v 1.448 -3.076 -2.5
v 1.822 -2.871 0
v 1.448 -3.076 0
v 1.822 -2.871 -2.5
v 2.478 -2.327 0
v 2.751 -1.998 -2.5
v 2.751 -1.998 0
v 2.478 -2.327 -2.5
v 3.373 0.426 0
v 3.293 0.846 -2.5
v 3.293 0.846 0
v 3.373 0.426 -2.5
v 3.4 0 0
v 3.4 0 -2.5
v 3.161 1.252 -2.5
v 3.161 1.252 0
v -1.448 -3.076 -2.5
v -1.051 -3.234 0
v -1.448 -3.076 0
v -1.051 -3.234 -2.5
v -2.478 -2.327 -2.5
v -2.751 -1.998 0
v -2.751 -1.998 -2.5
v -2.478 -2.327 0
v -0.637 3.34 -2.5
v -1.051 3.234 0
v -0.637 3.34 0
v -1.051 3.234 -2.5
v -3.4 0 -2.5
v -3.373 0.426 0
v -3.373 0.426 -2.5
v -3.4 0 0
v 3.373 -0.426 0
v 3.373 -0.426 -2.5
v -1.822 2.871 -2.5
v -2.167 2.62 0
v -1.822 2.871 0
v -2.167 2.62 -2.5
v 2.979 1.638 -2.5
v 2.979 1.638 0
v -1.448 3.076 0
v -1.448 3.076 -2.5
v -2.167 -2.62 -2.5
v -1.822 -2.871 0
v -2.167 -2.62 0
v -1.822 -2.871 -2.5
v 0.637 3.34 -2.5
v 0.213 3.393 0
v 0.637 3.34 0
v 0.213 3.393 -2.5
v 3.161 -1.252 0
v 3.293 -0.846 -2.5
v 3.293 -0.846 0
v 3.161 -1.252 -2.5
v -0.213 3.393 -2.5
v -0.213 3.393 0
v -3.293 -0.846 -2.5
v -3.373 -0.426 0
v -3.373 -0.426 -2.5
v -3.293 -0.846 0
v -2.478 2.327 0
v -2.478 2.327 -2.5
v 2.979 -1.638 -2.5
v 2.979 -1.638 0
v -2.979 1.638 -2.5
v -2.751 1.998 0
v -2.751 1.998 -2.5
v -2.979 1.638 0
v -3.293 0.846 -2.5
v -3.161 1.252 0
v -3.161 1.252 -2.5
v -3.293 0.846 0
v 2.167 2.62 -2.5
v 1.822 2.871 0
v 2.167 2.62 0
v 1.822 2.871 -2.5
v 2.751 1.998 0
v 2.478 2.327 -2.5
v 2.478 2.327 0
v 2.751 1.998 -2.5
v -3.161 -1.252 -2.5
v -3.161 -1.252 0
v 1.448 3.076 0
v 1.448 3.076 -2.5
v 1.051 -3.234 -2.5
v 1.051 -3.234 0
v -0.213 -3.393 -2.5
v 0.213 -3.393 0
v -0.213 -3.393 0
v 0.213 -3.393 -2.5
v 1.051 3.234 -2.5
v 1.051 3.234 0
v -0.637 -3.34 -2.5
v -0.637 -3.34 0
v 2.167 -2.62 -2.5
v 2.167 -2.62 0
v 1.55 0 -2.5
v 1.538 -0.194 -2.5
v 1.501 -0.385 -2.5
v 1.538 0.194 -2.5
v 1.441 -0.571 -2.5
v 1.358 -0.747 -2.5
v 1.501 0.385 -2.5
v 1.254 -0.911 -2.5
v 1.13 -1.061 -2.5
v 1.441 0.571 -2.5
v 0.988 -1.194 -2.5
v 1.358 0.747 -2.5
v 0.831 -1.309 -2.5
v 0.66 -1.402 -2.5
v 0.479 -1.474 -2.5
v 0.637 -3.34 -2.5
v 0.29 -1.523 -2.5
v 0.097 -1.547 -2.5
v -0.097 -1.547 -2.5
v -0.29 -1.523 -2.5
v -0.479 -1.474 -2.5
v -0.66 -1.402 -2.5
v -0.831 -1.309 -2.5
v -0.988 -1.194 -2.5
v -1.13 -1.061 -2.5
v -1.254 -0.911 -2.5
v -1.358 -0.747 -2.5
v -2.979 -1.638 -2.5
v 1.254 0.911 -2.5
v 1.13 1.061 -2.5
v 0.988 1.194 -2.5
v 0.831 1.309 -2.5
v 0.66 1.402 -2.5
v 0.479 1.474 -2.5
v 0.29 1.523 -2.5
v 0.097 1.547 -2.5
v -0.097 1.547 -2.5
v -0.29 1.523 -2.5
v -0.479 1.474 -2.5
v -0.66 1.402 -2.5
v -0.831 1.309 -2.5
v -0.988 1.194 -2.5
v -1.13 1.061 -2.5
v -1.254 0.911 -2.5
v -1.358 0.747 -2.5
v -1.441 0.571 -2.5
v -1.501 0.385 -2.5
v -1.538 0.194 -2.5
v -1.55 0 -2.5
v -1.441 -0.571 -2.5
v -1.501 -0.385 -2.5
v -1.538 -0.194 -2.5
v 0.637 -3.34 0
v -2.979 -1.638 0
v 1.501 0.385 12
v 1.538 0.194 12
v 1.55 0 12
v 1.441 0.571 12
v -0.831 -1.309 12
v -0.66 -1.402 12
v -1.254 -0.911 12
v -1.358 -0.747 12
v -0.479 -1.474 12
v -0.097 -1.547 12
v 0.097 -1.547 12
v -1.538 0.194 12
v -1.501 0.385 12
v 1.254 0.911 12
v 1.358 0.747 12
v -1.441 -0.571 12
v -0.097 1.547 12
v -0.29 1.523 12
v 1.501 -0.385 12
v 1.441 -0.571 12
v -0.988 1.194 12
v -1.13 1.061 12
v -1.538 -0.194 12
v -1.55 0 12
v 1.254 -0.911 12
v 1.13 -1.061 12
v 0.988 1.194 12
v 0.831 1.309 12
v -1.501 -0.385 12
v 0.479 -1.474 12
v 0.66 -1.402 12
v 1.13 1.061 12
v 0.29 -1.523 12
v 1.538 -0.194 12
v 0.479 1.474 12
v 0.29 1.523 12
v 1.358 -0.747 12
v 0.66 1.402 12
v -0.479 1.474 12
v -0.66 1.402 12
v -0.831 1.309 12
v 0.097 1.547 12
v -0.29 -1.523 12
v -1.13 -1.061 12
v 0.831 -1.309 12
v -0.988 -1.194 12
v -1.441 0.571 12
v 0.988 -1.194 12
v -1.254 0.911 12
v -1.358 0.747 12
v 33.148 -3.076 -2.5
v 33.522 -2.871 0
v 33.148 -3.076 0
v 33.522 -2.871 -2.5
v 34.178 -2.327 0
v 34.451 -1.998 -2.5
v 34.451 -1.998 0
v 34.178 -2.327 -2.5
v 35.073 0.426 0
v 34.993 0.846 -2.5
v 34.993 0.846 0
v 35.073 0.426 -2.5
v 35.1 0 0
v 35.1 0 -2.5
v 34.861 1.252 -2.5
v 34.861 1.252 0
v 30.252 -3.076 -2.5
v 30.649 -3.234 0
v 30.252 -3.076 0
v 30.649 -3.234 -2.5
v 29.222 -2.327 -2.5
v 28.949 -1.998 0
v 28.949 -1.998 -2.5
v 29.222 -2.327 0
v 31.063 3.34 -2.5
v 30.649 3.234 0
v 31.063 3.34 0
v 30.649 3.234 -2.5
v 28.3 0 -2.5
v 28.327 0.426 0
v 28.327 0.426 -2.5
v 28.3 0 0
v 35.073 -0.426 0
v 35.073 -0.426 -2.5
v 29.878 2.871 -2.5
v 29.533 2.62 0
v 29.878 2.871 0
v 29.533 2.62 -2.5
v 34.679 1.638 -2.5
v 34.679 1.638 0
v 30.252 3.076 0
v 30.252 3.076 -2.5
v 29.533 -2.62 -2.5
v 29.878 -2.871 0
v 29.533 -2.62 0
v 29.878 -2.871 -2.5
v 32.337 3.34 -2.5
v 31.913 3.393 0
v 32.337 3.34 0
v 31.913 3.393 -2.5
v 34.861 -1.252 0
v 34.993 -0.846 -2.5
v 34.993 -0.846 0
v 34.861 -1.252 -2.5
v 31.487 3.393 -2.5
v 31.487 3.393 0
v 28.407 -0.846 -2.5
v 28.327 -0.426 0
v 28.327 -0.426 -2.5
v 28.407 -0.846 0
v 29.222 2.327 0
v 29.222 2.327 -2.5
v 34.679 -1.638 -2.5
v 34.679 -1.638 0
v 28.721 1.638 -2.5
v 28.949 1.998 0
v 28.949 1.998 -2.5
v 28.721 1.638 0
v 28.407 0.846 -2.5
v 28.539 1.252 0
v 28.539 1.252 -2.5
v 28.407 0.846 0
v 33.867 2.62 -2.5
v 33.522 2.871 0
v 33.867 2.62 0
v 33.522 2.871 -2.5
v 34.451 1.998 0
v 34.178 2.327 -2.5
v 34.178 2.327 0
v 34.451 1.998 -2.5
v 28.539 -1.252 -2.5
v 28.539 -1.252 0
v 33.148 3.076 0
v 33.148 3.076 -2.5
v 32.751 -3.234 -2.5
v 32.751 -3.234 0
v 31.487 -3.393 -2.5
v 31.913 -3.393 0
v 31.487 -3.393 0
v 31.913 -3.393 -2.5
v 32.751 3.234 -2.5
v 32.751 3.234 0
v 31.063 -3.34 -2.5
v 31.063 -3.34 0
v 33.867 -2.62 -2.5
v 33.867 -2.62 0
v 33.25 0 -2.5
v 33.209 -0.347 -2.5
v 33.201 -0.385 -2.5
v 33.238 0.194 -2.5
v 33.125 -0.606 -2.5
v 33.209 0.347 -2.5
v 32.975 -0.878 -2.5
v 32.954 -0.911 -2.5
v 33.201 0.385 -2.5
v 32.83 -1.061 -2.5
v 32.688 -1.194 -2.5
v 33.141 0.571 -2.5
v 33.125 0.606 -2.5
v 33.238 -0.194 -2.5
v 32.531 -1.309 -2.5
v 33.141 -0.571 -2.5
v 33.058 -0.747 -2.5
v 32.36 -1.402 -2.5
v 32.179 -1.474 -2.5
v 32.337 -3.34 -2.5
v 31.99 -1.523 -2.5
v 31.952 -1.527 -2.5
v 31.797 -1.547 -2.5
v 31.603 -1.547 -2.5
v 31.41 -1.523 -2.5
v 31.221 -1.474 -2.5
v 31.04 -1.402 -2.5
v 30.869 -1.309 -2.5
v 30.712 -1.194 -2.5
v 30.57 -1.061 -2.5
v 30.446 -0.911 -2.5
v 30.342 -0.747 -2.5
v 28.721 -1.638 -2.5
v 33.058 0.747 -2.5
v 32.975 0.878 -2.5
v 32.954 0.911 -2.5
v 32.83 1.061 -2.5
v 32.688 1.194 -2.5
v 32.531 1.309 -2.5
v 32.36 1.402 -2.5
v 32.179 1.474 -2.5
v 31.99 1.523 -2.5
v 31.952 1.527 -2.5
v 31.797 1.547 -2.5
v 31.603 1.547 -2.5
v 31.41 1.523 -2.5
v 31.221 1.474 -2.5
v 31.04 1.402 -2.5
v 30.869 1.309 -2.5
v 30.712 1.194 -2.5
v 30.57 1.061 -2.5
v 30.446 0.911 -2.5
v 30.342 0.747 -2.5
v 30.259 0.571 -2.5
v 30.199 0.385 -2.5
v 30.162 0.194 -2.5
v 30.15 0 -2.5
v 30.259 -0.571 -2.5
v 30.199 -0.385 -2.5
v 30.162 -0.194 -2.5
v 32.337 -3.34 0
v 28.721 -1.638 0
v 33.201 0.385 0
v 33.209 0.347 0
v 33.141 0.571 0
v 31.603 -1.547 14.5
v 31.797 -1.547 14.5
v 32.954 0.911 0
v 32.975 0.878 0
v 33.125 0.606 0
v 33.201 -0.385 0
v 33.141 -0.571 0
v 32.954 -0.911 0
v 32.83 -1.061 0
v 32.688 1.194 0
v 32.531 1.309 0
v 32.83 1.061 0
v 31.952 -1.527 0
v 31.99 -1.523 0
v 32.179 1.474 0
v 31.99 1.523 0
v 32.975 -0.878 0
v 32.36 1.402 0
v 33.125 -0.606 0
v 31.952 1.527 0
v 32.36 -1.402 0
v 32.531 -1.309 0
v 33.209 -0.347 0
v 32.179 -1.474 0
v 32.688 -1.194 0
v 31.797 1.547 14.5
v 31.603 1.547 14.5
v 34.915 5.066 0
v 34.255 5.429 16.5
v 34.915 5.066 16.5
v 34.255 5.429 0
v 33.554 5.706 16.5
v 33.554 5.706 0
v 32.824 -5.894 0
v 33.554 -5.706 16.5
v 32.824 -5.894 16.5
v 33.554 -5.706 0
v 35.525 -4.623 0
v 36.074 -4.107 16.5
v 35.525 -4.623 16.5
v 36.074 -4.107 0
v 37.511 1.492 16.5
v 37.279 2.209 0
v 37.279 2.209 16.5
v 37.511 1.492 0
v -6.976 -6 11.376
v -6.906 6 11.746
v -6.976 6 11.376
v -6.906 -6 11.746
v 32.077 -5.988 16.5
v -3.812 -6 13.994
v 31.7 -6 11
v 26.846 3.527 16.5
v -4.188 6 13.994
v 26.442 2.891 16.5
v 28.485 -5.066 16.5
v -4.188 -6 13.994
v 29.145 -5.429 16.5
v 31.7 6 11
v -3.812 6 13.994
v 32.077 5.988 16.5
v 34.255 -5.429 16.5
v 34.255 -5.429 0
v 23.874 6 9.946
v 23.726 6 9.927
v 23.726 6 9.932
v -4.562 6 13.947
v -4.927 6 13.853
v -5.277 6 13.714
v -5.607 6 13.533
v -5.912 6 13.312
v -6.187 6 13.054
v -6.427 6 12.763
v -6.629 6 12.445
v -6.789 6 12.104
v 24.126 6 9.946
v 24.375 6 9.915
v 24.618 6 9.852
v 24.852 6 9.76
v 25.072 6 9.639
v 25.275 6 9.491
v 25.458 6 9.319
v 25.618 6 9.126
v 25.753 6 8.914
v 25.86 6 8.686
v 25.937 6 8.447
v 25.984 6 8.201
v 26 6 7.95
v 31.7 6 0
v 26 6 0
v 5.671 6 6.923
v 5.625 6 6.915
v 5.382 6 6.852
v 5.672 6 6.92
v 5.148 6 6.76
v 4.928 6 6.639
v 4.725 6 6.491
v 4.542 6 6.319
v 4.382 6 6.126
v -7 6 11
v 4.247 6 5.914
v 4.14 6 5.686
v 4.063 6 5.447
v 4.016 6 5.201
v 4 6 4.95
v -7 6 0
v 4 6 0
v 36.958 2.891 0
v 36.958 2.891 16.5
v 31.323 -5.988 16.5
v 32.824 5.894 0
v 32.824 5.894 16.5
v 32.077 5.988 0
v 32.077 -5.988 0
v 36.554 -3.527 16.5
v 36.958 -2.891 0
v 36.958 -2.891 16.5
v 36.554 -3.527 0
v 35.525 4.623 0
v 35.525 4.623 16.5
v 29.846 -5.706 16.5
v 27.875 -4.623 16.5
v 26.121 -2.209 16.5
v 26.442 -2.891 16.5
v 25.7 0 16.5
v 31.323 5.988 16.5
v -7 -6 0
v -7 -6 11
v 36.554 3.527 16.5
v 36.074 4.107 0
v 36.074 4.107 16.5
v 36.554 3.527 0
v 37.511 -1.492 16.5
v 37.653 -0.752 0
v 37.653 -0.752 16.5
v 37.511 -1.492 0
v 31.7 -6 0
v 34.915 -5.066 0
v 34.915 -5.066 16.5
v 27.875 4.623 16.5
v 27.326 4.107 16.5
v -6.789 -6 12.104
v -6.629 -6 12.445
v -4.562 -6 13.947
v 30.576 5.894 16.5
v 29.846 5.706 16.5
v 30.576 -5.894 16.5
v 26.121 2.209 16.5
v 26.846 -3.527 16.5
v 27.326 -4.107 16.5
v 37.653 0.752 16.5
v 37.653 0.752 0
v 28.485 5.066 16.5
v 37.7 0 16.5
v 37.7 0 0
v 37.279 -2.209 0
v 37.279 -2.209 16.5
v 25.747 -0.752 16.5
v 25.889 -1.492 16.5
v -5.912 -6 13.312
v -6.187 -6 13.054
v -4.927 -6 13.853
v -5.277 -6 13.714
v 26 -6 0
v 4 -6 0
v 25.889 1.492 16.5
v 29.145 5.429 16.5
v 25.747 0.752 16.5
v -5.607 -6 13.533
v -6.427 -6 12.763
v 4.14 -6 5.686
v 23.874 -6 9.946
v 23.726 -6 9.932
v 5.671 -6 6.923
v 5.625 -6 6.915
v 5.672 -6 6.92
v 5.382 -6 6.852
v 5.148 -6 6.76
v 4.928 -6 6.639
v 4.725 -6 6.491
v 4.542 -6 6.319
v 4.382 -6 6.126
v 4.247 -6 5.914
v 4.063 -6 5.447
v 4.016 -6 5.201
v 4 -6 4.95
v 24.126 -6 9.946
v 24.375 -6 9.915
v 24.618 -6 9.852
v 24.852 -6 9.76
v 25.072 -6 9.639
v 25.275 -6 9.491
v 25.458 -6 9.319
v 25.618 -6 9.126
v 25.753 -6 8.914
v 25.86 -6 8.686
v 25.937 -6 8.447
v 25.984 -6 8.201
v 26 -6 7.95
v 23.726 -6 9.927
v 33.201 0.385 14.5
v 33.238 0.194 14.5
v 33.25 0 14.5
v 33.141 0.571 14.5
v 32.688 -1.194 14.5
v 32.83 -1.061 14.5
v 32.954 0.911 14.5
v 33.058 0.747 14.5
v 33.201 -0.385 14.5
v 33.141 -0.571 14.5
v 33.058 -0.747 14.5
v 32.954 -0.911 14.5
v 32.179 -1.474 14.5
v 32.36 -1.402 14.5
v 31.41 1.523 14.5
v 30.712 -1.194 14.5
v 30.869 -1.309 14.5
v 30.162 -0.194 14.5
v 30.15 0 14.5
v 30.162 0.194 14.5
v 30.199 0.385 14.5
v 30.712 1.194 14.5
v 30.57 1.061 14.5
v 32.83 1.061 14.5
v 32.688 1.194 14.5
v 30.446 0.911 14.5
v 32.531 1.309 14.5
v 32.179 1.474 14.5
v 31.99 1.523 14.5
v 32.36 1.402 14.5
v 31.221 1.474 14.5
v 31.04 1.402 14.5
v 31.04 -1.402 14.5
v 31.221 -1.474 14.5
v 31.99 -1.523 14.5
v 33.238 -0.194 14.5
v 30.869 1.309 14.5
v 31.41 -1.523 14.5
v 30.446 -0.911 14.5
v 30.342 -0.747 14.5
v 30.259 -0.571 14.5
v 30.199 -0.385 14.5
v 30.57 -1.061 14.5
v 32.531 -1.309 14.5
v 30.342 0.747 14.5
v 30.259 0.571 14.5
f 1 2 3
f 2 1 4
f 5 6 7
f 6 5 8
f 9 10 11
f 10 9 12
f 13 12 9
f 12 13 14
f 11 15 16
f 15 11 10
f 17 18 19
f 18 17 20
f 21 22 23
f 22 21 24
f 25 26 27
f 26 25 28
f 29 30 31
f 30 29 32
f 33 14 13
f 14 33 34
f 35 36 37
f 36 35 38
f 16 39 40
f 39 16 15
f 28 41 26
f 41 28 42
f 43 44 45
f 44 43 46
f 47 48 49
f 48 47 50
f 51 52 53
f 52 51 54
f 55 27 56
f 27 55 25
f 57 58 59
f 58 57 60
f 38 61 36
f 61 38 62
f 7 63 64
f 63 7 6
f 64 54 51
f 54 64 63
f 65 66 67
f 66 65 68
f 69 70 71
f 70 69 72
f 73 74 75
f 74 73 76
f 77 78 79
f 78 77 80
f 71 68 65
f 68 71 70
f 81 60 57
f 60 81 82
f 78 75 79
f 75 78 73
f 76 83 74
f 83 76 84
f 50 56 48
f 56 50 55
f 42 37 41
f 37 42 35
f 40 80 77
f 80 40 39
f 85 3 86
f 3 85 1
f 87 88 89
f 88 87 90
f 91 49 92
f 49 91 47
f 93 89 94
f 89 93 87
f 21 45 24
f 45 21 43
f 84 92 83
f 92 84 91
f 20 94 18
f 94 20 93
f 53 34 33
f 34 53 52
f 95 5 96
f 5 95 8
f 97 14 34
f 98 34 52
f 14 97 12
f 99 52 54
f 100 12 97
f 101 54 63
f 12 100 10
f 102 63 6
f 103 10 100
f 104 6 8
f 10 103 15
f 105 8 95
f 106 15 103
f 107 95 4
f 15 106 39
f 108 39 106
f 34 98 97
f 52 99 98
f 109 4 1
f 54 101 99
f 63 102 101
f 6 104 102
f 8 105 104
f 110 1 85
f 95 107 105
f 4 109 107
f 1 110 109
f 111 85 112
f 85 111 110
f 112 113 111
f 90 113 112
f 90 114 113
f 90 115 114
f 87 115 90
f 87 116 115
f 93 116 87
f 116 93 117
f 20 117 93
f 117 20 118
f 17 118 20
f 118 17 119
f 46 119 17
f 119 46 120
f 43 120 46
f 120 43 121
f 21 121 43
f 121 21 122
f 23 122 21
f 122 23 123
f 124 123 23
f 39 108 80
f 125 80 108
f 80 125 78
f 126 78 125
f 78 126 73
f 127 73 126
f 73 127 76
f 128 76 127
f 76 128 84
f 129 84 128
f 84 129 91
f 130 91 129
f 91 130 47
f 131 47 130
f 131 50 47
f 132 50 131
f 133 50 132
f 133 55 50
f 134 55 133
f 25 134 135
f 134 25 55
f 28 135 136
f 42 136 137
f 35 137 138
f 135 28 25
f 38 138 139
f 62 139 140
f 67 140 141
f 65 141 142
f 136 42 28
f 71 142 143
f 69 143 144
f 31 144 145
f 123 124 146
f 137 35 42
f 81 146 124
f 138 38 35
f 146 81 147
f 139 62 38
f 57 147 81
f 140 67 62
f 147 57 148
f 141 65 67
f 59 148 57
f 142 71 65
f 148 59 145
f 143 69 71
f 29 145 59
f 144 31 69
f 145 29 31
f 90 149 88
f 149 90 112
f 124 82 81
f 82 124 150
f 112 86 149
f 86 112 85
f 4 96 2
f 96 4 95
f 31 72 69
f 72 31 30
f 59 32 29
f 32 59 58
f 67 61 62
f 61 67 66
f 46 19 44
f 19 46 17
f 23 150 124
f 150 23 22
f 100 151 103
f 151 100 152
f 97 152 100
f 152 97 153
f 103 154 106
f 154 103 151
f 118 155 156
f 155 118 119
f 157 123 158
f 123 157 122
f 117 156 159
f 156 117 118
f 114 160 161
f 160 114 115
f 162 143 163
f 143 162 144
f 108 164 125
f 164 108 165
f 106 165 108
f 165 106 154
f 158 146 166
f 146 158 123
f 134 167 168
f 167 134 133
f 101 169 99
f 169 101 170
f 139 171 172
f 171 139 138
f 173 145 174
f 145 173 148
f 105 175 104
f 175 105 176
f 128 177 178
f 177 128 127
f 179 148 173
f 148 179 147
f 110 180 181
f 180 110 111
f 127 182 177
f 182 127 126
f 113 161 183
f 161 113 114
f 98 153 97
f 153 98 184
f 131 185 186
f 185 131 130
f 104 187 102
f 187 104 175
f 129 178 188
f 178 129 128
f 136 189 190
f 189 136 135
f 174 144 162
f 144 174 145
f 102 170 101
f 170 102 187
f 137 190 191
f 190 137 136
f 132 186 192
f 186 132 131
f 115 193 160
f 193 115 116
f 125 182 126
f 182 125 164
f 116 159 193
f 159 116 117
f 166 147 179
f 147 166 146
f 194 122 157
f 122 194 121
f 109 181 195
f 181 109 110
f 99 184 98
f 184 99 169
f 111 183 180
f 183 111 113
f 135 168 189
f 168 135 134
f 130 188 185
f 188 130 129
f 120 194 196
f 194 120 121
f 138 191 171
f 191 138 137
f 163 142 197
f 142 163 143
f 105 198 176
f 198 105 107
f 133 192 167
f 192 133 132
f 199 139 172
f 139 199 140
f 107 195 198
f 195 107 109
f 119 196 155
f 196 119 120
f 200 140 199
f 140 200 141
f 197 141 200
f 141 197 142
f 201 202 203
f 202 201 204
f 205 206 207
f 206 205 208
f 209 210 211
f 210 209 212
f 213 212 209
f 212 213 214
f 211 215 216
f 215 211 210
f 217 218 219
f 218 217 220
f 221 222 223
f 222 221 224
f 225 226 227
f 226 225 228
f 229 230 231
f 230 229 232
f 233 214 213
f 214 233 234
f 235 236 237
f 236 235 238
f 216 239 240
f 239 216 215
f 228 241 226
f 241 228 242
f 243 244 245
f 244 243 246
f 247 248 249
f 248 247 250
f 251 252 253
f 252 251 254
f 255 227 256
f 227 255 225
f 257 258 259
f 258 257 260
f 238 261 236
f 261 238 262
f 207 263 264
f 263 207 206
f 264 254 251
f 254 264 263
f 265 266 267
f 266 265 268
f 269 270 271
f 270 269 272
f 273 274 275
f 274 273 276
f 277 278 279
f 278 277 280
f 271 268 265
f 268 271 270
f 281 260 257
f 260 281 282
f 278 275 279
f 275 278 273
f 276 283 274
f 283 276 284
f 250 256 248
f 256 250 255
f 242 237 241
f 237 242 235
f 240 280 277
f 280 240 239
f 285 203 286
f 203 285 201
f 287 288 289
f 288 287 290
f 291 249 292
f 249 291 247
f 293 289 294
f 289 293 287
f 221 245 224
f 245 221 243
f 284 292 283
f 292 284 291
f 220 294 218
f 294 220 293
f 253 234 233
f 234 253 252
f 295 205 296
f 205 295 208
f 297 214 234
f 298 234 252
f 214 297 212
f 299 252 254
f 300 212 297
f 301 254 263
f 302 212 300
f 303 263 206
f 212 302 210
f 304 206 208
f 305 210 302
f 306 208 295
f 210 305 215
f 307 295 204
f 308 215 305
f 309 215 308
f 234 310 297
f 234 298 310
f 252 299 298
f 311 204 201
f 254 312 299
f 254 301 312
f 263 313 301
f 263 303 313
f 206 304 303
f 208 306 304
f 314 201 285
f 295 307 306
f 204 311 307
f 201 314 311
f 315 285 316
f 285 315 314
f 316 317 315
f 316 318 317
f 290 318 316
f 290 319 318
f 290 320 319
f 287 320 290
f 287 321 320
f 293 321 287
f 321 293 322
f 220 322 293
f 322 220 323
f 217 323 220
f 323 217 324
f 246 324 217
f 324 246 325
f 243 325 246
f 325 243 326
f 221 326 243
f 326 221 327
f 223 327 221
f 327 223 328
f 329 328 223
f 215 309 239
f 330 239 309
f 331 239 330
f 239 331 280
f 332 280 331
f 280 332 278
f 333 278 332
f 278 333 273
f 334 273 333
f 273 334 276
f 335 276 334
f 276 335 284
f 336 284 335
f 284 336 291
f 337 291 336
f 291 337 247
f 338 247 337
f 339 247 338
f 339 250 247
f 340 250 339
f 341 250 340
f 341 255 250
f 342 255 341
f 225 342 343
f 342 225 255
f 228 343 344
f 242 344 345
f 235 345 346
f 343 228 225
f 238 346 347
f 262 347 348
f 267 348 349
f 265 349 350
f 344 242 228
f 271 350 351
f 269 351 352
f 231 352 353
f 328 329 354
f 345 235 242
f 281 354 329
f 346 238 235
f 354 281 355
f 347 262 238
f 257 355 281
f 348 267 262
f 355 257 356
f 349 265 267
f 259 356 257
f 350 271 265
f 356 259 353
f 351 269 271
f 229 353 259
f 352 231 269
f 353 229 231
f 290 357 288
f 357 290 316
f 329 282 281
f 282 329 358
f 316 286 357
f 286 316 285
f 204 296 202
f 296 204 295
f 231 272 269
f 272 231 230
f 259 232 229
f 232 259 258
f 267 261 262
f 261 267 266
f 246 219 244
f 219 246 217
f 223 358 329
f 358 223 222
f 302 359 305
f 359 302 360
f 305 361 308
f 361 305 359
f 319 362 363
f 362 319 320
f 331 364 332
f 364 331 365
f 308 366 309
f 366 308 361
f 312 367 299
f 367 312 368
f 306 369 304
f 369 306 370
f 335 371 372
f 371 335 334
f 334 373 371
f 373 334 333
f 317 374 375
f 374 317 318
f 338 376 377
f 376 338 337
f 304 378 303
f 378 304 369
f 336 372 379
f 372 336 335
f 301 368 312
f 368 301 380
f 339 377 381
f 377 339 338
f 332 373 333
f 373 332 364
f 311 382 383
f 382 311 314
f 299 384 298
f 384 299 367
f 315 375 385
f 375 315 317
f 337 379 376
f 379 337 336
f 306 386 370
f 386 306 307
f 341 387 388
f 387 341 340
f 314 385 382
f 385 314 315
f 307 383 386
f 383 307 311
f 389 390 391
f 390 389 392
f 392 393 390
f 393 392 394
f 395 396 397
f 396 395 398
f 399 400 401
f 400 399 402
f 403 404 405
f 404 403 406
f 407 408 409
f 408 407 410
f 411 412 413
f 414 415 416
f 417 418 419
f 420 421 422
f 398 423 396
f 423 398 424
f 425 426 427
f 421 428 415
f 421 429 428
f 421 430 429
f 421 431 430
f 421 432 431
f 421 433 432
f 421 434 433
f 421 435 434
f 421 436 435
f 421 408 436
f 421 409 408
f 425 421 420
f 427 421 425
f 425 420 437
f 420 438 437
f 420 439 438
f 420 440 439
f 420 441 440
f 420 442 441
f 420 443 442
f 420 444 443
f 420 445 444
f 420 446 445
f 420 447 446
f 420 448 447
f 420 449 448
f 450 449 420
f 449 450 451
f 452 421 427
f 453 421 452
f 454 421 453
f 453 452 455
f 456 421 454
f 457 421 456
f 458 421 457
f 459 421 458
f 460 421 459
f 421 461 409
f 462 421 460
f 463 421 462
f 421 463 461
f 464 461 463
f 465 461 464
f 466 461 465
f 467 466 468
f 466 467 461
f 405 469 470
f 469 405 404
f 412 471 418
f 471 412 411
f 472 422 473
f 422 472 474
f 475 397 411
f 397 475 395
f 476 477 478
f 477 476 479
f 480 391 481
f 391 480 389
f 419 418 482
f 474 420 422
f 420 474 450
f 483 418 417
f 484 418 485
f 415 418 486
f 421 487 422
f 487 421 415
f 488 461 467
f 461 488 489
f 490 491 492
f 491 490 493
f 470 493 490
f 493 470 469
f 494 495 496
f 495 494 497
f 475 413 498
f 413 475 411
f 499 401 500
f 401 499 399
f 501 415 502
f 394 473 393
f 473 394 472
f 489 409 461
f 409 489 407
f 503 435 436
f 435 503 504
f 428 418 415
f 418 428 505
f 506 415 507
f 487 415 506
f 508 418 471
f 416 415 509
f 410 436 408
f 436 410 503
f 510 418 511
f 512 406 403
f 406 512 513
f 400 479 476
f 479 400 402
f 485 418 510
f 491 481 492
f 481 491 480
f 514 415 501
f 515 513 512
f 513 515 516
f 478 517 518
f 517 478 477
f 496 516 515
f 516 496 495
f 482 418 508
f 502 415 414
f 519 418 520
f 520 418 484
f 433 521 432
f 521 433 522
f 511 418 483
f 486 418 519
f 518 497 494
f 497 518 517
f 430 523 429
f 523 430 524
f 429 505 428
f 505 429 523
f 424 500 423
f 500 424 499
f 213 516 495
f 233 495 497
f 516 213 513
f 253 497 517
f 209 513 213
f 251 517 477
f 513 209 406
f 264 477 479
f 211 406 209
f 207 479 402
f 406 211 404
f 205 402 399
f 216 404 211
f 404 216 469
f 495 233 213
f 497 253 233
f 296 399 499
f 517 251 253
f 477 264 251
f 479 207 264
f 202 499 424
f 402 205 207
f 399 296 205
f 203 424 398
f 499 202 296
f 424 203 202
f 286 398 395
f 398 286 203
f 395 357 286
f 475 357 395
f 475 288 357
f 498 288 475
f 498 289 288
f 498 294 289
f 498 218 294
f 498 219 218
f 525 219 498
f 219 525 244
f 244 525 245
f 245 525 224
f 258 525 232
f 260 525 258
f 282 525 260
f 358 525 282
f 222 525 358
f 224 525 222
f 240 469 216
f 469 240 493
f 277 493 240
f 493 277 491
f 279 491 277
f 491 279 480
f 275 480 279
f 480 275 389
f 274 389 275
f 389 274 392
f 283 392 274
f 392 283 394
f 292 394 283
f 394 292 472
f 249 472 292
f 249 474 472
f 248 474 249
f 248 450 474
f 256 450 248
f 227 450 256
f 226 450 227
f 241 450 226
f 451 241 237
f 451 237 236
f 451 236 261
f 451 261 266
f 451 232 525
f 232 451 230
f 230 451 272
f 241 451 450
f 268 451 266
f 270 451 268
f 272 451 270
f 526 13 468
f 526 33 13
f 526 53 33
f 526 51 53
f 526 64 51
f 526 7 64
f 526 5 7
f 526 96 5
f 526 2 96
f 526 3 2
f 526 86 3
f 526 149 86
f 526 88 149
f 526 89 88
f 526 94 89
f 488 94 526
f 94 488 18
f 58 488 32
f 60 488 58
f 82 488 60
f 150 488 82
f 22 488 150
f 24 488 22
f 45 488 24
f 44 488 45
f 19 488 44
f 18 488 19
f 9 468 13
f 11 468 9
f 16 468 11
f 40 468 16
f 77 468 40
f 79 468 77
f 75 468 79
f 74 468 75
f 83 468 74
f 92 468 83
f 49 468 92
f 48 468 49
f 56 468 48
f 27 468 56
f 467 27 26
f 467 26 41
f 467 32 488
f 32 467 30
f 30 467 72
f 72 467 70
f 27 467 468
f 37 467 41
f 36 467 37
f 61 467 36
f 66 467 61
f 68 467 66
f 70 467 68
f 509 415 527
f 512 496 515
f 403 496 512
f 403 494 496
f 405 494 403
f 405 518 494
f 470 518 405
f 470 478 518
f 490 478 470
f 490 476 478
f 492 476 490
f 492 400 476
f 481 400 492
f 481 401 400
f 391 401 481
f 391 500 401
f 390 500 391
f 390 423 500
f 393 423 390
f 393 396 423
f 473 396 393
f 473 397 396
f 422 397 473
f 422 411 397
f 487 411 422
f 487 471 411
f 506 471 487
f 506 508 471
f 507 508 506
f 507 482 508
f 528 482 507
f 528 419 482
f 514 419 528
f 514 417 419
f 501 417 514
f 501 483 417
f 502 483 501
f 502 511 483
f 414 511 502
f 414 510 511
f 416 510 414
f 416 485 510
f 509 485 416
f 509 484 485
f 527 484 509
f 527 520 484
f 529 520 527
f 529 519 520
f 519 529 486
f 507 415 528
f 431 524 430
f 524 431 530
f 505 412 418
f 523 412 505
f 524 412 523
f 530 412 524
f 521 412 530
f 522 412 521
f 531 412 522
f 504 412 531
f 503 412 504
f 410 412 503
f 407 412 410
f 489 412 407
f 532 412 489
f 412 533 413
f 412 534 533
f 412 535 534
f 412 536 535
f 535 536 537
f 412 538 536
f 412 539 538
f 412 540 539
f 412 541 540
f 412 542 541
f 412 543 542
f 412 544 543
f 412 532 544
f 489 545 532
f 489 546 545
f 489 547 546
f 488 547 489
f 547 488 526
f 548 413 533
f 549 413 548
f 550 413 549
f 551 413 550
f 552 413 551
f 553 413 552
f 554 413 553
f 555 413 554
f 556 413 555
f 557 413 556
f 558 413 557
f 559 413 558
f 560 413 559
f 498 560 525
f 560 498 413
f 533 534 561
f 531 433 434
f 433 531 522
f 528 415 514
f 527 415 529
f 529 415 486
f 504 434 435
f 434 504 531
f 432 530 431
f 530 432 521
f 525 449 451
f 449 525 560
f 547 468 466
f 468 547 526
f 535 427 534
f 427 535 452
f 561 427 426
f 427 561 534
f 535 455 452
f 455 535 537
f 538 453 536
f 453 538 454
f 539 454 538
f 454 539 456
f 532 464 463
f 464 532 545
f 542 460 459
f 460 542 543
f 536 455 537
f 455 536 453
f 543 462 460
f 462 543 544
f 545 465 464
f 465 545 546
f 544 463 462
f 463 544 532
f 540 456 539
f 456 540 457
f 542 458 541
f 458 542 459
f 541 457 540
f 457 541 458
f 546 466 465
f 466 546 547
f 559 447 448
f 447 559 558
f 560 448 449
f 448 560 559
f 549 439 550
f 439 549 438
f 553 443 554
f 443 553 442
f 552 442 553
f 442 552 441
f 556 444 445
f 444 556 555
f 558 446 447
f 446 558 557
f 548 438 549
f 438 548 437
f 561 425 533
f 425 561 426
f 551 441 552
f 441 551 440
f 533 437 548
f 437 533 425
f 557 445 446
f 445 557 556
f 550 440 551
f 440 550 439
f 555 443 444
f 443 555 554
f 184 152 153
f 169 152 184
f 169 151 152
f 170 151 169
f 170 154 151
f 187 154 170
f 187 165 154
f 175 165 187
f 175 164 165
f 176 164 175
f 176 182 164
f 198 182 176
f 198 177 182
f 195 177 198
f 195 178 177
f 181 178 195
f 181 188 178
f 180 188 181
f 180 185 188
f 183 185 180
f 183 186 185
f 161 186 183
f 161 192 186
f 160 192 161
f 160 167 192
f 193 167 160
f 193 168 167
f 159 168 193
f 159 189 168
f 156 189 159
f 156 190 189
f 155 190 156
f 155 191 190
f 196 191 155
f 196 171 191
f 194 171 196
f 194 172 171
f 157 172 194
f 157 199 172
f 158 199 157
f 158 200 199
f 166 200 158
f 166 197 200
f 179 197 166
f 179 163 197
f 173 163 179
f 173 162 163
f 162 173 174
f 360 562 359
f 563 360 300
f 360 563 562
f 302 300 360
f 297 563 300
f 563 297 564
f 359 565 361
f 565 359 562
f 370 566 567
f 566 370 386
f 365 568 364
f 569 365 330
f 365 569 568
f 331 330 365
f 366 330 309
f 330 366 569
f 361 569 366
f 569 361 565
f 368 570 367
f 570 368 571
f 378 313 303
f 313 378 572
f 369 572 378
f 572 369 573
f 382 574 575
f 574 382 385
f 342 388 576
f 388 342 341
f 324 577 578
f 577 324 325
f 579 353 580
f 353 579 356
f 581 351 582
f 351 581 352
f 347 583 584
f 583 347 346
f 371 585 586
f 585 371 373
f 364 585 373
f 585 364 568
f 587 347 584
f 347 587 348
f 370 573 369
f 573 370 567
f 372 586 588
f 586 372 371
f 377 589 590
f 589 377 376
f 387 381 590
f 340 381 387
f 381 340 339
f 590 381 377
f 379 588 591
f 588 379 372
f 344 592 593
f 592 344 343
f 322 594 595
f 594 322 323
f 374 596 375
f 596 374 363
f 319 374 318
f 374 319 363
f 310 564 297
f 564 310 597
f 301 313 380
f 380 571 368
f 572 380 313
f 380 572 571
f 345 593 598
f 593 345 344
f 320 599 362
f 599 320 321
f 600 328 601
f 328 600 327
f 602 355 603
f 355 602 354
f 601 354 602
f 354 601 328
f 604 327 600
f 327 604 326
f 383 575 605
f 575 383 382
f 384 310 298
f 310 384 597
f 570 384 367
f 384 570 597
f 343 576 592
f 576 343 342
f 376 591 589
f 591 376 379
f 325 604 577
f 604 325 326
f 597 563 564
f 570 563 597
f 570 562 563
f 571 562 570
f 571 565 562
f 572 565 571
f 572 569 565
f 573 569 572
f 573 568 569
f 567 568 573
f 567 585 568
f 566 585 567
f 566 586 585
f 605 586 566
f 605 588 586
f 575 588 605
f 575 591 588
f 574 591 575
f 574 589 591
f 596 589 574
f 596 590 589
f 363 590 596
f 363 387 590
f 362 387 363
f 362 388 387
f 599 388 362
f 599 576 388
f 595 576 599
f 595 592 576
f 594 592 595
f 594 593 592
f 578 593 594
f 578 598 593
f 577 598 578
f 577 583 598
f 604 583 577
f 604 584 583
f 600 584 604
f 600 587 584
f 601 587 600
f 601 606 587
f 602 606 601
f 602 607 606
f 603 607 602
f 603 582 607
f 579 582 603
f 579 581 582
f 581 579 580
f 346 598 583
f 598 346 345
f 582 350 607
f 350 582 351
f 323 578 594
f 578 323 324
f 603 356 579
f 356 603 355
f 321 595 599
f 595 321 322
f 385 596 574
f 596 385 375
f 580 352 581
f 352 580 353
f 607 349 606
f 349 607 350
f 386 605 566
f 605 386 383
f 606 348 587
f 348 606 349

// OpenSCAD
lr = 12;    //12.2;
lg = 46;    //45.8;

h1 = 14;
h2 = 16.5;

dist_vis = 31.7;
delta_vis_h1 = 7;

lg_trou = 22;
dist_lg = 11;
ep_trou_h1 = 7;
ep_trou_h2 = 6.5;


h_cyl = 2.5;
d_cyl = 6.8;
//d_cyl_org = 7;
d_trou_vis = 3.1;   //3.5;


//-----------------------------------//

attache_valise(0,0,0);

module cylindre_vis(x,y,z,h)
{
    $fn = 50;
    hcyl = h + h_cyl;
    r1 = d_trou_vis * 0.5;
    r2 = d_cyl * 0.5;
    
    translate([x,y,z-h_cyl])
    {
        difference()
        {
            cylinder(hcyl,r2,r2);
            translate([0,0,0])
            cylinder(hcyl-1,r1,r1);
        }
    }
}

module trou_vis(x,y,z,h)
{
    $fn = 50;
    hcyl = h + h_cyl;
    r1 = d_trou_vis * 0.5;
    r2 = d_cyl * 0.5;
    
    translate([x,y,z-h_cyl])
    {
        cylinder(hcyl-1,r1,r1);
    }
}

module creux_sangle(x,y,z)
{
    $fn = 50;
    
    r_coin = 2;
    
    x1 = lg_trou;
    y1 = lr+2;
    z1 = h1 - ep_trou_h1;
    
    z2 = h2 - ep_trou_h2;
    
    //angle = 9.46;
    angle = atan2((z2-z1),lg_trou-2*r_coin);   //je ne tombe pas sur le bon angle !!!???
    
    x2 = sqrt(pow(x1,2)+pow(x1*tan(angle),2));
    y2 = lr;
    
    
    z3 = 3*r_coin;
    dx = 2*r_coin*sin(angle);
    dz = z1-r_coin*3+(2*r_coin*(1-cos(angle)));
    
    //echo(atan2((z2-z1),lg_trou-2*r_coin));
    //echo(angle);
    //echo(dz);
    //echo(r_coin*(1-cos(angle)));
    
    
    
    translate([x-ep_trou_h1+dist_lg,y-1-lr*0.5,z])
    {
        union()
        {
            translate([x1-2*r_coin,0,z1-r_coin-1])
            cube([r_coin*2,y1,z2-z1+1]);
            cube([x1,y1,z1-r_coin]);
            
            /*translate([r_coin,-0.2,z1-r_coin])
            rotate([0,-angle,0])
            #cube([x2-2*r_coin,y1,r_coin]);*/
            
            translate([dx+r_coin,0,dz])
            rotate([0,-angle,0])
            cube([x2-2*r_coin,y1,r_coin*3]);
                    
            //angles rond
            translate([r_coin,lr+2,z1-r_coin])
            rotate([90,0,0])
            cylinder(lr+2,r_coin,r_coin);
            
            translate([x1-r_coin,lr+2,z2-r_coin])
            rotate([90,0,0])
            cylinder(lr+2,r_coin,r_coin);
        }
    }
}
        
module part_ext(x,y,z)
{
    $fn = 50;
    
    r1 = lr*0.5;
    r2 = 3;
    
    x1 = delta_vis_h1+dist_vis;
    y1 = lr;
    z1 = h1-r2;
    
    translate([x,y,z])
    {
        hull()
        {
            translate([dist_vis,0,0])
            cylinder(h2,r1,r1);
            
            translate([-delta_vis_h1+r2,lr*0.5,h1-r2])
            rotate([90,0,0])
            cylinder(lr,r2,r2);
            
            translate([-delta_vis_h1,-y1*0.5,0])
            cube([x1,y1,z1]);
            
        }
    }
}

module attache_valise(x,y,z)
{
    translate([x,y,z])
    {
        difference()
        {
            union()
            {
                part_ext(0,0,0);
                cylindre_vis(0,0,0,h1-1);
                cylindre_vis(dist_vis,0,0,h2-1);
            }
            union()
            {
                trou_vis(0,0,0,h1-1);
                trou_vis(dist_vis,0,0,h2-1);
                creux_sangle(0,0,-0.05);
            }
        }
    }
}
